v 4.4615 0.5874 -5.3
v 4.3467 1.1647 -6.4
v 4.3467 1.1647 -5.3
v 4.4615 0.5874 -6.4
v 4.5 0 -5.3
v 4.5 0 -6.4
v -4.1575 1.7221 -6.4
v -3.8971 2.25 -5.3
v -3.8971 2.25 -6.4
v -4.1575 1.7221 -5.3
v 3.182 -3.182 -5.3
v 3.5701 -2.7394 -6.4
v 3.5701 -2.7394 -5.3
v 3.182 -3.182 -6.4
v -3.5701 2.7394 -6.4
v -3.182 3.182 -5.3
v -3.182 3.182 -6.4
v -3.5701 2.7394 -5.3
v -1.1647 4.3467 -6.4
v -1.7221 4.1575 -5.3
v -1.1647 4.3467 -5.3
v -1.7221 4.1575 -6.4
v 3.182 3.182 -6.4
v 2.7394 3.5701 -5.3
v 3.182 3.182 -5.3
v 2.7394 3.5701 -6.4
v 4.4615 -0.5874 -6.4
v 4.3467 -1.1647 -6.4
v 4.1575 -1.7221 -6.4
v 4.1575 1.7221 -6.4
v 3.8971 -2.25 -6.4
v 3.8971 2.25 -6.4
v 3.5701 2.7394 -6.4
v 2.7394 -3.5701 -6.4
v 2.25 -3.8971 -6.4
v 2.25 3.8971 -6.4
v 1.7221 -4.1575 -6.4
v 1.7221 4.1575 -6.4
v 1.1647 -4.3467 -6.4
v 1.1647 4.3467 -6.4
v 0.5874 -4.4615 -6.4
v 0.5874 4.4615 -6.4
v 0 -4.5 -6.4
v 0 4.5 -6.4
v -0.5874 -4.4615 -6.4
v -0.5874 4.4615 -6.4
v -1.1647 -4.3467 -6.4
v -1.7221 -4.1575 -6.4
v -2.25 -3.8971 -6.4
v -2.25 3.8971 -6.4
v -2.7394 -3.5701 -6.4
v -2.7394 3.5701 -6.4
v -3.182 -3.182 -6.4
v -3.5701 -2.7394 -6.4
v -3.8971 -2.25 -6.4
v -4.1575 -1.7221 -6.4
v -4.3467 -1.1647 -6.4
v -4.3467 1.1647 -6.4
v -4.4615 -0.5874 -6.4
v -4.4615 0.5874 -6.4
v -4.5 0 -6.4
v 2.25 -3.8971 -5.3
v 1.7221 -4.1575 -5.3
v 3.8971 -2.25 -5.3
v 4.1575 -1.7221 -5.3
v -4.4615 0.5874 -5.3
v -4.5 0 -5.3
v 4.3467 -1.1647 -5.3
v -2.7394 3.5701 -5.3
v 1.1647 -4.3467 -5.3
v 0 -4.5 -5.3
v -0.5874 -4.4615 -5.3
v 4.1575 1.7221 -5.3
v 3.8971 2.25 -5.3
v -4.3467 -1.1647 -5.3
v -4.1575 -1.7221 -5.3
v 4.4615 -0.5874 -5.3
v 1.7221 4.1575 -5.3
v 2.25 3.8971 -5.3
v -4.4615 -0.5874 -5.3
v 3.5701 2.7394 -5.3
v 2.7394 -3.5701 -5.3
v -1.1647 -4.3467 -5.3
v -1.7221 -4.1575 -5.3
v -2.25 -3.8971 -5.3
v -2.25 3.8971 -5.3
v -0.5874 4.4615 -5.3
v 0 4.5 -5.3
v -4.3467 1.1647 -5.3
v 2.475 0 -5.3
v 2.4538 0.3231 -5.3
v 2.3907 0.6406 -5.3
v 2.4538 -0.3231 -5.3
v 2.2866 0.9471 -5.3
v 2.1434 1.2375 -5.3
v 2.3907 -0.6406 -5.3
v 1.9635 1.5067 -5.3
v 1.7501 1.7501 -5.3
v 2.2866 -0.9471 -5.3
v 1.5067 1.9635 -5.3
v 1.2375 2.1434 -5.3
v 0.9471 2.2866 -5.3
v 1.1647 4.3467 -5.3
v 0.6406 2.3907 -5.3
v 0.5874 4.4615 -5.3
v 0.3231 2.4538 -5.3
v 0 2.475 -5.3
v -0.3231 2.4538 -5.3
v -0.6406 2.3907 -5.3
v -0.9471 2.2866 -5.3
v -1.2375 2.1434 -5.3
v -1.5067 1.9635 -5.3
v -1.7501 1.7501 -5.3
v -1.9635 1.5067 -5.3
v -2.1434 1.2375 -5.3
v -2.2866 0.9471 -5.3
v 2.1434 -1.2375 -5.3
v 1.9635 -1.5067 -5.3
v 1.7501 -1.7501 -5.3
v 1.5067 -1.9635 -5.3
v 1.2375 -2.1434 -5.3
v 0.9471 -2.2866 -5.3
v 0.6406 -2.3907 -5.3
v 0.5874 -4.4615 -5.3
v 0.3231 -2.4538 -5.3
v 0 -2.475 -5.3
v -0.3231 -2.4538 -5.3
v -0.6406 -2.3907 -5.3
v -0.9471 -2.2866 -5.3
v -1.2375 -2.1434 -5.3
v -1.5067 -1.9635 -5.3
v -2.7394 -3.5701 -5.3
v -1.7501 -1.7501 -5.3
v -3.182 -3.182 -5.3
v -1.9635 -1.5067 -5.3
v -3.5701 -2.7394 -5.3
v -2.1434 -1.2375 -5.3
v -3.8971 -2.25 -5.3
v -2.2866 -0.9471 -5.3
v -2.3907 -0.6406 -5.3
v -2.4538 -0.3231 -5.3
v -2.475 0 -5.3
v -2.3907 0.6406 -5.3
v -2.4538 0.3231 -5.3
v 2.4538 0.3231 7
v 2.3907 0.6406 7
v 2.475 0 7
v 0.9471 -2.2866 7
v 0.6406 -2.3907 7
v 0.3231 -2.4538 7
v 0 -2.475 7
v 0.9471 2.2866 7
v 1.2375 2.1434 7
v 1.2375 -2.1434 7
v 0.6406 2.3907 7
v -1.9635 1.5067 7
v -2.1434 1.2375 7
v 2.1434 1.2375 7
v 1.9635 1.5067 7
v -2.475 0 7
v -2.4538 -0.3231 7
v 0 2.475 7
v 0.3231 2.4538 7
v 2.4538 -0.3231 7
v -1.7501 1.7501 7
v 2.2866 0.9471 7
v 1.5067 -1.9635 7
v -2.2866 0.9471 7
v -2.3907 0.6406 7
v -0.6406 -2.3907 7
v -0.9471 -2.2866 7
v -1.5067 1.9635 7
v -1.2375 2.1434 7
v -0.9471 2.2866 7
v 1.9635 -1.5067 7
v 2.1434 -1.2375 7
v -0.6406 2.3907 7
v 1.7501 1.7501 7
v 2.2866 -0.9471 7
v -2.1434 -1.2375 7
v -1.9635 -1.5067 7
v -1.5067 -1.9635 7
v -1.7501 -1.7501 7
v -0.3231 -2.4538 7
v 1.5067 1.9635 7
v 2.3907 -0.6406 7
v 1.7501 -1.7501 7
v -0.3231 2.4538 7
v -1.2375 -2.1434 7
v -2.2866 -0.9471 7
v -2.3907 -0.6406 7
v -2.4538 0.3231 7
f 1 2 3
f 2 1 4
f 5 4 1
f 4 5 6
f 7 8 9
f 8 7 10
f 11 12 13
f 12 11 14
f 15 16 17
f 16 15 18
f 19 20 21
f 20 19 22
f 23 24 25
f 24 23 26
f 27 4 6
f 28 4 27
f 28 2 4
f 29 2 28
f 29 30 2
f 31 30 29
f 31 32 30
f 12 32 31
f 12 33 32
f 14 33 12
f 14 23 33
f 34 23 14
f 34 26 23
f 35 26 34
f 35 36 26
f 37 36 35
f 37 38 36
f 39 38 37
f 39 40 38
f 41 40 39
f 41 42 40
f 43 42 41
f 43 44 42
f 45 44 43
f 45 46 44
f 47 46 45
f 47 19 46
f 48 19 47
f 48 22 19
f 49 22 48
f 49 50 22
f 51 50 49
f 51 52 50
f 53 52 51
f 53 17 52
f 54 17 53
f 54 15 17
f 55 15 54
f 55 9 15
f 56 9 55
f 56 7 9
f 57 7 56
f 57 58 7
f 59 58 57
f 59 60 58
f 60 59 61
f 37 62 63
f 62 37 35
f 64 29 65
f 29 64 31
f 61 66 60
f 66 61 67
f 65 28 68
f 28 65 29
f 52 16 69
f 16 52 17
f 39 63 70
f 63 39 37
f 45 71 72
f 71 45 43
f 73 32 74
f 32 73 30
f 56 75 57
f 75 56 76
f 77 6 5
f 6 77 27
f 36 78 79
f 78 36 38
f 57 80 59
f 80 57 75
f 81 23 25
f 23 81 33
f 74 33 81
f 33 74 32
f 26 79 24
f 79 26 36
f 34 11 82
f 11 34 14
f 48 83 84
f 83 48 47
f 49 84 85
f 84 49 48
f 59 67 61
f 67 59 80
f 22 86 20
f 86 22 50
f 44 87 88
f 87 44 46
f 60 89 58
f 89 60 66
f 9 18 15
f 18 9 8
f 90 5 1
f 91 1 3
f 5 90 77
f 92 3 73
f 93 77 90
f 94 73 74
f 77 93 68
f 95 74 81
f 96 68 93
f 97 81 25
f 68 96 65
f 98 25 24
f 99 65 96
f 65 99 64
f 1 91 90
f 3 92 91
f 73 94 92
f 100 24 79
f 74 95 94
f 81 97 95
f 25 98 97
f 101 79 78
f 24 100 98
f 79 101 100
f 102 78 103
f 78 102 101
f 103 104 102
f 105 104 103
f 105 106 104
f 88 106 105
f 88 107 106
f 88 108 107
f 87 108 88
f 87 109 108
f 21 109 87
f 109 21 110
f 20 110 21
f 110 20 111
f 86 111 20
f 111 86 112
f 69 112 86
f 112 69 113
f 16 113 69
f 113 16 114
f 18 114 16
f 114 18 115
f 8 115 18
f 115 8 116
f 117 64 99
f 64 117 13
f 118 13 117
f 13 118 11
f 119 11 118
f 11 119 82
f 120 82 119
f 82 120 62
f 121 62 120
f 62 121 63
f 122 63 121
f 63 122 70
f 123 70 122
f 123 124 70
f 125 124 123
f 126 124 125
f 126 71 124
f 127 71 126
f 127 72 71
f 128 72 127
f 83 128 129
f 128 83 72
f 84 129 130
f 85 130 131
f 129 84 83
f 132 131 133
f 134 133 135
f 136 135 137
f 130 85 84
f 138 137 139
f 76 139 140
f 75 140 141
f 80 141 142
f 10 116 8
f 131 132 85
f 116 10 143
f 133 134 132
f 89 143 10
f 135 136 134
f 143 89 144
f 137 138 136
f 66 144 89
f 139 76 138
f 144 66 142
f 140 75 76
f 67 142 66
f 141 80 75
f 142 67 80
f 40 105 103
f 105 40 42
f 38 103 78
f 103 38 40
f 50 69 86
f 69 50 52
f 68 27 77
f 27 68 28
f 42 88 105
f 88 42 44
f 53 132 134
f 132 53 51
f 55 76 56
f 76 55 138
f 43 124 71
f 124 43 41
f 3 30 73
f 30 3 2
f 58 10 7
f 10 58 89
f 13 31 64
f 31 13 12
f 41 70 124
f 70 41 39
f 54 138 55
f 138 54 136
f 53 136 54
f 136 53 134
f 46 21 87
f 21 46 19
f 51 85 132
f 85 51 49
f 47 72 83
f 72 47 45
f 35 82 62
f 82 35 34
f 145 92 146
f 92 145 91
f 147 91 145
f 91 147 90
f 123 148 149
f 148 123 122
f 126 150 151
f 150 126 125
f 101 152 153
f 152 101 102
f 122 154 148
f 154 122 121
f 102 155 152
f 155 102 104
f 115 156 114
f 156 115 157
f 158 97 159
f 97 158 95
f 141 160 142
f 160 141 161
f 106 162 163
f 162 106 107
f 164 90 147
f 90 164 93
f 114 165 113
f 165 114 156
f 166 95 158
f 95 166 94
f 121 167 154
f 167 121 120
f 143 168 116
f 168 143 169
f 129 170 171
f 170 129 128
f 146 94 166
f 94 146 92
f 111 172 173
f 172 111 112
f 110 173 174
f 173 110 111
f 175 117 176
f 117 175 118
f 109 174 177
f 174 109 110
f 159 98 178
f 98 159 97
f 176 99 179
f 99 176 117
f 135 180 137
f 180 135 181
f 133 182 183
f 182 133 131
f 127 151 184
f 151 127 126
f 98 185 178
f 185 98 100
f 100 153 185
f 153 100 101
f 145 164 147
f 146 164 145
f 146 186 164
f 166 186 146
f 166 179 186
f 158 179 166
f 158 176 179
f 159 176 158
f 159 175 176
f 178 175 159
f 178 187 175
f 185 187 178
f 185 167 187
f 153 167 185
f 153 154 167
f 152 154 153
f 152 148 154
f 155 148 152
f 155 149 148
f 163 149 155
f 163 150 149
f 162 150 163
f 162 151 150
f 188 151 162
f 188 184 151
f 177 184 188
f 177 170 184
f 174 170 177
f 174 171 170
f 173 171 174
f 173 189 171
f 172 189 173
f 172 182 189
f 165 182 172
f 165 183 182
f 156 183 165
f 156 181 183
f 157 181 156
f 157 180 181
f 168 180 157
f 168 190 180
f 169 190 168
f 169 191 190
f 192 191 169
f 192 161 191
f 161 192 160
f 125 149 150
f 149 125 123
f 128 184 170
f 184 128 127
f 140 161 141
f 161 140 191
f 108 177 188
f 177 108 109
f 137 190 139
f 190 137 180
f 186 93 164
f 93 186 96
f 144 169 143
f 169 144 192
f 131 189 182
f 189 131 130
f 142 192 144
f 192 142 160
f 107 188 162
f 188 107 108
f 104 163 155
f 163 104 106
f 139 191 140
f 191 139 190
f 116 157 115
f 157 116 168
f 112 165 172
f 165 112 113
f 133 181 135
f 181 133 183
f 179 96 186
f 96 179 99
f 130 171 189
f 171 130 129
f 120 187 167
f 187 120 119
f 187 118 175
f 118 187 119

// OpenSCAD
// idler_pin: F6 then export STL
include <../lib/g1_servo_arm.scad>
part = "idler_pin";
